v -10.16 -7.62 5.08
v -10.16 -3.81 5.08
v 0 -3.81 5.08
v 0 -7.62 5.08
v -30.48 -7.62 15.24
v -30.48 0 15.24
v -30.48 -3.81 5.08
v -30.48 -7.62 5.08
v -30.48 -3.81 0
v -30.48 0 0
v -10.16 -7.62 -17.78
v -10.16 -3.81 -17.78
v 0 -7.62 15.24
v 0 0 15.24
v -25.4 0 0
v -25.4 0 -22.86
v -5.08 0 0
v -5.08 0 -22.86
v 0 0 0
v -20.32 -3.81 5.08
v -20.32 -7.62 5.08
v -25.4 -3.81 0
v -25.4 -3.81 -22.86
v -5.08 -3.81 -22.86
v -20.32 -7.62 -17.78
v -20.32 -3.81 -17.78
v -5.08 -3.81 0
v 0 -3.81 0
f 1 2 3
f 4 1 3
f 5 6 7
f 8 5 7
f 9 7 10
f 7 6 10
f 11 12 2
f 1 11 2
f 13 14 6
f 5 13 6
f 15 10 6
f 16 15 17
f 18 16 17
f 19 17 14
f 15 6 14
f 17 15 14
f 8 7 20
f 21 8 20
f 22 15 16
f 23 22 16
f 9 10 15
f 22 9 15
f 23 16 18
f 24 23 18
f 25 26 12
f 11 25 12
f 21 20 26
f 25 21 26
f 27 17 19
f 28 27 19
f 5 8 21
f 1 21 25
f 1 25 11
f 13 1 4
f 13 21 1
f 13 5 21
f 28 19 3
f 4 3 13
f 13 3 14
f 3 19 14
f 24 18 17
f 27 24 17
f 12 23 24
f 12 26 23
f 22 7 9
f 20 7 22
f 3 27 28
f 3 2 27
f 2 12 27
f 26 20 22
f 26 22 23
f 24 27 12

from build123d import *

# Parameters (mm, degrees)
F1_DEPTH = 7.62
F2_DEPTH = 3.81


# Not quite as in the source:
# - a feature names something its author has since deleted; it is built from what else it names


with BuildPart() as f1:
    # F0 (on Front) → F1 (new body)
    with BuildSketch(Plane.XZ):
        Polygon((-20.32, 5.08), (-20.32, -17.78), (-10.16, -17.78), (-10.16, 5.08), (0, 5.08), (0, 15.24), (-30.48, 15.24), (-30.48, 5.08), align=None)
    extrude(amount=F1_DEPTH)

    # F0 (on Front) → F2 (join)
    with BuildSketch(Plane.XZ):
        Polygon((-10.16, 5.08), (-10.16, -17.78), (-5.08, -17.78), (-5.08, 0), (0, 0), (0, 5.08), align=None)
        Polygon((-20.32, -17.78), (-25.4, -17.78), (-25.4, -22.86), (-5.08, -22.86), (-5.08, -17.78), (-10.16, -17.78), align=None)
        Polygon((-25.4, 0), (-25.4, -17.78), (-20.32, -17.78), (-20.32, 5.08), (-30.48, 5.08), (-30.48, 0), align=None)
    extrude(amount=F2_DEPTH)


solid = f1.part
